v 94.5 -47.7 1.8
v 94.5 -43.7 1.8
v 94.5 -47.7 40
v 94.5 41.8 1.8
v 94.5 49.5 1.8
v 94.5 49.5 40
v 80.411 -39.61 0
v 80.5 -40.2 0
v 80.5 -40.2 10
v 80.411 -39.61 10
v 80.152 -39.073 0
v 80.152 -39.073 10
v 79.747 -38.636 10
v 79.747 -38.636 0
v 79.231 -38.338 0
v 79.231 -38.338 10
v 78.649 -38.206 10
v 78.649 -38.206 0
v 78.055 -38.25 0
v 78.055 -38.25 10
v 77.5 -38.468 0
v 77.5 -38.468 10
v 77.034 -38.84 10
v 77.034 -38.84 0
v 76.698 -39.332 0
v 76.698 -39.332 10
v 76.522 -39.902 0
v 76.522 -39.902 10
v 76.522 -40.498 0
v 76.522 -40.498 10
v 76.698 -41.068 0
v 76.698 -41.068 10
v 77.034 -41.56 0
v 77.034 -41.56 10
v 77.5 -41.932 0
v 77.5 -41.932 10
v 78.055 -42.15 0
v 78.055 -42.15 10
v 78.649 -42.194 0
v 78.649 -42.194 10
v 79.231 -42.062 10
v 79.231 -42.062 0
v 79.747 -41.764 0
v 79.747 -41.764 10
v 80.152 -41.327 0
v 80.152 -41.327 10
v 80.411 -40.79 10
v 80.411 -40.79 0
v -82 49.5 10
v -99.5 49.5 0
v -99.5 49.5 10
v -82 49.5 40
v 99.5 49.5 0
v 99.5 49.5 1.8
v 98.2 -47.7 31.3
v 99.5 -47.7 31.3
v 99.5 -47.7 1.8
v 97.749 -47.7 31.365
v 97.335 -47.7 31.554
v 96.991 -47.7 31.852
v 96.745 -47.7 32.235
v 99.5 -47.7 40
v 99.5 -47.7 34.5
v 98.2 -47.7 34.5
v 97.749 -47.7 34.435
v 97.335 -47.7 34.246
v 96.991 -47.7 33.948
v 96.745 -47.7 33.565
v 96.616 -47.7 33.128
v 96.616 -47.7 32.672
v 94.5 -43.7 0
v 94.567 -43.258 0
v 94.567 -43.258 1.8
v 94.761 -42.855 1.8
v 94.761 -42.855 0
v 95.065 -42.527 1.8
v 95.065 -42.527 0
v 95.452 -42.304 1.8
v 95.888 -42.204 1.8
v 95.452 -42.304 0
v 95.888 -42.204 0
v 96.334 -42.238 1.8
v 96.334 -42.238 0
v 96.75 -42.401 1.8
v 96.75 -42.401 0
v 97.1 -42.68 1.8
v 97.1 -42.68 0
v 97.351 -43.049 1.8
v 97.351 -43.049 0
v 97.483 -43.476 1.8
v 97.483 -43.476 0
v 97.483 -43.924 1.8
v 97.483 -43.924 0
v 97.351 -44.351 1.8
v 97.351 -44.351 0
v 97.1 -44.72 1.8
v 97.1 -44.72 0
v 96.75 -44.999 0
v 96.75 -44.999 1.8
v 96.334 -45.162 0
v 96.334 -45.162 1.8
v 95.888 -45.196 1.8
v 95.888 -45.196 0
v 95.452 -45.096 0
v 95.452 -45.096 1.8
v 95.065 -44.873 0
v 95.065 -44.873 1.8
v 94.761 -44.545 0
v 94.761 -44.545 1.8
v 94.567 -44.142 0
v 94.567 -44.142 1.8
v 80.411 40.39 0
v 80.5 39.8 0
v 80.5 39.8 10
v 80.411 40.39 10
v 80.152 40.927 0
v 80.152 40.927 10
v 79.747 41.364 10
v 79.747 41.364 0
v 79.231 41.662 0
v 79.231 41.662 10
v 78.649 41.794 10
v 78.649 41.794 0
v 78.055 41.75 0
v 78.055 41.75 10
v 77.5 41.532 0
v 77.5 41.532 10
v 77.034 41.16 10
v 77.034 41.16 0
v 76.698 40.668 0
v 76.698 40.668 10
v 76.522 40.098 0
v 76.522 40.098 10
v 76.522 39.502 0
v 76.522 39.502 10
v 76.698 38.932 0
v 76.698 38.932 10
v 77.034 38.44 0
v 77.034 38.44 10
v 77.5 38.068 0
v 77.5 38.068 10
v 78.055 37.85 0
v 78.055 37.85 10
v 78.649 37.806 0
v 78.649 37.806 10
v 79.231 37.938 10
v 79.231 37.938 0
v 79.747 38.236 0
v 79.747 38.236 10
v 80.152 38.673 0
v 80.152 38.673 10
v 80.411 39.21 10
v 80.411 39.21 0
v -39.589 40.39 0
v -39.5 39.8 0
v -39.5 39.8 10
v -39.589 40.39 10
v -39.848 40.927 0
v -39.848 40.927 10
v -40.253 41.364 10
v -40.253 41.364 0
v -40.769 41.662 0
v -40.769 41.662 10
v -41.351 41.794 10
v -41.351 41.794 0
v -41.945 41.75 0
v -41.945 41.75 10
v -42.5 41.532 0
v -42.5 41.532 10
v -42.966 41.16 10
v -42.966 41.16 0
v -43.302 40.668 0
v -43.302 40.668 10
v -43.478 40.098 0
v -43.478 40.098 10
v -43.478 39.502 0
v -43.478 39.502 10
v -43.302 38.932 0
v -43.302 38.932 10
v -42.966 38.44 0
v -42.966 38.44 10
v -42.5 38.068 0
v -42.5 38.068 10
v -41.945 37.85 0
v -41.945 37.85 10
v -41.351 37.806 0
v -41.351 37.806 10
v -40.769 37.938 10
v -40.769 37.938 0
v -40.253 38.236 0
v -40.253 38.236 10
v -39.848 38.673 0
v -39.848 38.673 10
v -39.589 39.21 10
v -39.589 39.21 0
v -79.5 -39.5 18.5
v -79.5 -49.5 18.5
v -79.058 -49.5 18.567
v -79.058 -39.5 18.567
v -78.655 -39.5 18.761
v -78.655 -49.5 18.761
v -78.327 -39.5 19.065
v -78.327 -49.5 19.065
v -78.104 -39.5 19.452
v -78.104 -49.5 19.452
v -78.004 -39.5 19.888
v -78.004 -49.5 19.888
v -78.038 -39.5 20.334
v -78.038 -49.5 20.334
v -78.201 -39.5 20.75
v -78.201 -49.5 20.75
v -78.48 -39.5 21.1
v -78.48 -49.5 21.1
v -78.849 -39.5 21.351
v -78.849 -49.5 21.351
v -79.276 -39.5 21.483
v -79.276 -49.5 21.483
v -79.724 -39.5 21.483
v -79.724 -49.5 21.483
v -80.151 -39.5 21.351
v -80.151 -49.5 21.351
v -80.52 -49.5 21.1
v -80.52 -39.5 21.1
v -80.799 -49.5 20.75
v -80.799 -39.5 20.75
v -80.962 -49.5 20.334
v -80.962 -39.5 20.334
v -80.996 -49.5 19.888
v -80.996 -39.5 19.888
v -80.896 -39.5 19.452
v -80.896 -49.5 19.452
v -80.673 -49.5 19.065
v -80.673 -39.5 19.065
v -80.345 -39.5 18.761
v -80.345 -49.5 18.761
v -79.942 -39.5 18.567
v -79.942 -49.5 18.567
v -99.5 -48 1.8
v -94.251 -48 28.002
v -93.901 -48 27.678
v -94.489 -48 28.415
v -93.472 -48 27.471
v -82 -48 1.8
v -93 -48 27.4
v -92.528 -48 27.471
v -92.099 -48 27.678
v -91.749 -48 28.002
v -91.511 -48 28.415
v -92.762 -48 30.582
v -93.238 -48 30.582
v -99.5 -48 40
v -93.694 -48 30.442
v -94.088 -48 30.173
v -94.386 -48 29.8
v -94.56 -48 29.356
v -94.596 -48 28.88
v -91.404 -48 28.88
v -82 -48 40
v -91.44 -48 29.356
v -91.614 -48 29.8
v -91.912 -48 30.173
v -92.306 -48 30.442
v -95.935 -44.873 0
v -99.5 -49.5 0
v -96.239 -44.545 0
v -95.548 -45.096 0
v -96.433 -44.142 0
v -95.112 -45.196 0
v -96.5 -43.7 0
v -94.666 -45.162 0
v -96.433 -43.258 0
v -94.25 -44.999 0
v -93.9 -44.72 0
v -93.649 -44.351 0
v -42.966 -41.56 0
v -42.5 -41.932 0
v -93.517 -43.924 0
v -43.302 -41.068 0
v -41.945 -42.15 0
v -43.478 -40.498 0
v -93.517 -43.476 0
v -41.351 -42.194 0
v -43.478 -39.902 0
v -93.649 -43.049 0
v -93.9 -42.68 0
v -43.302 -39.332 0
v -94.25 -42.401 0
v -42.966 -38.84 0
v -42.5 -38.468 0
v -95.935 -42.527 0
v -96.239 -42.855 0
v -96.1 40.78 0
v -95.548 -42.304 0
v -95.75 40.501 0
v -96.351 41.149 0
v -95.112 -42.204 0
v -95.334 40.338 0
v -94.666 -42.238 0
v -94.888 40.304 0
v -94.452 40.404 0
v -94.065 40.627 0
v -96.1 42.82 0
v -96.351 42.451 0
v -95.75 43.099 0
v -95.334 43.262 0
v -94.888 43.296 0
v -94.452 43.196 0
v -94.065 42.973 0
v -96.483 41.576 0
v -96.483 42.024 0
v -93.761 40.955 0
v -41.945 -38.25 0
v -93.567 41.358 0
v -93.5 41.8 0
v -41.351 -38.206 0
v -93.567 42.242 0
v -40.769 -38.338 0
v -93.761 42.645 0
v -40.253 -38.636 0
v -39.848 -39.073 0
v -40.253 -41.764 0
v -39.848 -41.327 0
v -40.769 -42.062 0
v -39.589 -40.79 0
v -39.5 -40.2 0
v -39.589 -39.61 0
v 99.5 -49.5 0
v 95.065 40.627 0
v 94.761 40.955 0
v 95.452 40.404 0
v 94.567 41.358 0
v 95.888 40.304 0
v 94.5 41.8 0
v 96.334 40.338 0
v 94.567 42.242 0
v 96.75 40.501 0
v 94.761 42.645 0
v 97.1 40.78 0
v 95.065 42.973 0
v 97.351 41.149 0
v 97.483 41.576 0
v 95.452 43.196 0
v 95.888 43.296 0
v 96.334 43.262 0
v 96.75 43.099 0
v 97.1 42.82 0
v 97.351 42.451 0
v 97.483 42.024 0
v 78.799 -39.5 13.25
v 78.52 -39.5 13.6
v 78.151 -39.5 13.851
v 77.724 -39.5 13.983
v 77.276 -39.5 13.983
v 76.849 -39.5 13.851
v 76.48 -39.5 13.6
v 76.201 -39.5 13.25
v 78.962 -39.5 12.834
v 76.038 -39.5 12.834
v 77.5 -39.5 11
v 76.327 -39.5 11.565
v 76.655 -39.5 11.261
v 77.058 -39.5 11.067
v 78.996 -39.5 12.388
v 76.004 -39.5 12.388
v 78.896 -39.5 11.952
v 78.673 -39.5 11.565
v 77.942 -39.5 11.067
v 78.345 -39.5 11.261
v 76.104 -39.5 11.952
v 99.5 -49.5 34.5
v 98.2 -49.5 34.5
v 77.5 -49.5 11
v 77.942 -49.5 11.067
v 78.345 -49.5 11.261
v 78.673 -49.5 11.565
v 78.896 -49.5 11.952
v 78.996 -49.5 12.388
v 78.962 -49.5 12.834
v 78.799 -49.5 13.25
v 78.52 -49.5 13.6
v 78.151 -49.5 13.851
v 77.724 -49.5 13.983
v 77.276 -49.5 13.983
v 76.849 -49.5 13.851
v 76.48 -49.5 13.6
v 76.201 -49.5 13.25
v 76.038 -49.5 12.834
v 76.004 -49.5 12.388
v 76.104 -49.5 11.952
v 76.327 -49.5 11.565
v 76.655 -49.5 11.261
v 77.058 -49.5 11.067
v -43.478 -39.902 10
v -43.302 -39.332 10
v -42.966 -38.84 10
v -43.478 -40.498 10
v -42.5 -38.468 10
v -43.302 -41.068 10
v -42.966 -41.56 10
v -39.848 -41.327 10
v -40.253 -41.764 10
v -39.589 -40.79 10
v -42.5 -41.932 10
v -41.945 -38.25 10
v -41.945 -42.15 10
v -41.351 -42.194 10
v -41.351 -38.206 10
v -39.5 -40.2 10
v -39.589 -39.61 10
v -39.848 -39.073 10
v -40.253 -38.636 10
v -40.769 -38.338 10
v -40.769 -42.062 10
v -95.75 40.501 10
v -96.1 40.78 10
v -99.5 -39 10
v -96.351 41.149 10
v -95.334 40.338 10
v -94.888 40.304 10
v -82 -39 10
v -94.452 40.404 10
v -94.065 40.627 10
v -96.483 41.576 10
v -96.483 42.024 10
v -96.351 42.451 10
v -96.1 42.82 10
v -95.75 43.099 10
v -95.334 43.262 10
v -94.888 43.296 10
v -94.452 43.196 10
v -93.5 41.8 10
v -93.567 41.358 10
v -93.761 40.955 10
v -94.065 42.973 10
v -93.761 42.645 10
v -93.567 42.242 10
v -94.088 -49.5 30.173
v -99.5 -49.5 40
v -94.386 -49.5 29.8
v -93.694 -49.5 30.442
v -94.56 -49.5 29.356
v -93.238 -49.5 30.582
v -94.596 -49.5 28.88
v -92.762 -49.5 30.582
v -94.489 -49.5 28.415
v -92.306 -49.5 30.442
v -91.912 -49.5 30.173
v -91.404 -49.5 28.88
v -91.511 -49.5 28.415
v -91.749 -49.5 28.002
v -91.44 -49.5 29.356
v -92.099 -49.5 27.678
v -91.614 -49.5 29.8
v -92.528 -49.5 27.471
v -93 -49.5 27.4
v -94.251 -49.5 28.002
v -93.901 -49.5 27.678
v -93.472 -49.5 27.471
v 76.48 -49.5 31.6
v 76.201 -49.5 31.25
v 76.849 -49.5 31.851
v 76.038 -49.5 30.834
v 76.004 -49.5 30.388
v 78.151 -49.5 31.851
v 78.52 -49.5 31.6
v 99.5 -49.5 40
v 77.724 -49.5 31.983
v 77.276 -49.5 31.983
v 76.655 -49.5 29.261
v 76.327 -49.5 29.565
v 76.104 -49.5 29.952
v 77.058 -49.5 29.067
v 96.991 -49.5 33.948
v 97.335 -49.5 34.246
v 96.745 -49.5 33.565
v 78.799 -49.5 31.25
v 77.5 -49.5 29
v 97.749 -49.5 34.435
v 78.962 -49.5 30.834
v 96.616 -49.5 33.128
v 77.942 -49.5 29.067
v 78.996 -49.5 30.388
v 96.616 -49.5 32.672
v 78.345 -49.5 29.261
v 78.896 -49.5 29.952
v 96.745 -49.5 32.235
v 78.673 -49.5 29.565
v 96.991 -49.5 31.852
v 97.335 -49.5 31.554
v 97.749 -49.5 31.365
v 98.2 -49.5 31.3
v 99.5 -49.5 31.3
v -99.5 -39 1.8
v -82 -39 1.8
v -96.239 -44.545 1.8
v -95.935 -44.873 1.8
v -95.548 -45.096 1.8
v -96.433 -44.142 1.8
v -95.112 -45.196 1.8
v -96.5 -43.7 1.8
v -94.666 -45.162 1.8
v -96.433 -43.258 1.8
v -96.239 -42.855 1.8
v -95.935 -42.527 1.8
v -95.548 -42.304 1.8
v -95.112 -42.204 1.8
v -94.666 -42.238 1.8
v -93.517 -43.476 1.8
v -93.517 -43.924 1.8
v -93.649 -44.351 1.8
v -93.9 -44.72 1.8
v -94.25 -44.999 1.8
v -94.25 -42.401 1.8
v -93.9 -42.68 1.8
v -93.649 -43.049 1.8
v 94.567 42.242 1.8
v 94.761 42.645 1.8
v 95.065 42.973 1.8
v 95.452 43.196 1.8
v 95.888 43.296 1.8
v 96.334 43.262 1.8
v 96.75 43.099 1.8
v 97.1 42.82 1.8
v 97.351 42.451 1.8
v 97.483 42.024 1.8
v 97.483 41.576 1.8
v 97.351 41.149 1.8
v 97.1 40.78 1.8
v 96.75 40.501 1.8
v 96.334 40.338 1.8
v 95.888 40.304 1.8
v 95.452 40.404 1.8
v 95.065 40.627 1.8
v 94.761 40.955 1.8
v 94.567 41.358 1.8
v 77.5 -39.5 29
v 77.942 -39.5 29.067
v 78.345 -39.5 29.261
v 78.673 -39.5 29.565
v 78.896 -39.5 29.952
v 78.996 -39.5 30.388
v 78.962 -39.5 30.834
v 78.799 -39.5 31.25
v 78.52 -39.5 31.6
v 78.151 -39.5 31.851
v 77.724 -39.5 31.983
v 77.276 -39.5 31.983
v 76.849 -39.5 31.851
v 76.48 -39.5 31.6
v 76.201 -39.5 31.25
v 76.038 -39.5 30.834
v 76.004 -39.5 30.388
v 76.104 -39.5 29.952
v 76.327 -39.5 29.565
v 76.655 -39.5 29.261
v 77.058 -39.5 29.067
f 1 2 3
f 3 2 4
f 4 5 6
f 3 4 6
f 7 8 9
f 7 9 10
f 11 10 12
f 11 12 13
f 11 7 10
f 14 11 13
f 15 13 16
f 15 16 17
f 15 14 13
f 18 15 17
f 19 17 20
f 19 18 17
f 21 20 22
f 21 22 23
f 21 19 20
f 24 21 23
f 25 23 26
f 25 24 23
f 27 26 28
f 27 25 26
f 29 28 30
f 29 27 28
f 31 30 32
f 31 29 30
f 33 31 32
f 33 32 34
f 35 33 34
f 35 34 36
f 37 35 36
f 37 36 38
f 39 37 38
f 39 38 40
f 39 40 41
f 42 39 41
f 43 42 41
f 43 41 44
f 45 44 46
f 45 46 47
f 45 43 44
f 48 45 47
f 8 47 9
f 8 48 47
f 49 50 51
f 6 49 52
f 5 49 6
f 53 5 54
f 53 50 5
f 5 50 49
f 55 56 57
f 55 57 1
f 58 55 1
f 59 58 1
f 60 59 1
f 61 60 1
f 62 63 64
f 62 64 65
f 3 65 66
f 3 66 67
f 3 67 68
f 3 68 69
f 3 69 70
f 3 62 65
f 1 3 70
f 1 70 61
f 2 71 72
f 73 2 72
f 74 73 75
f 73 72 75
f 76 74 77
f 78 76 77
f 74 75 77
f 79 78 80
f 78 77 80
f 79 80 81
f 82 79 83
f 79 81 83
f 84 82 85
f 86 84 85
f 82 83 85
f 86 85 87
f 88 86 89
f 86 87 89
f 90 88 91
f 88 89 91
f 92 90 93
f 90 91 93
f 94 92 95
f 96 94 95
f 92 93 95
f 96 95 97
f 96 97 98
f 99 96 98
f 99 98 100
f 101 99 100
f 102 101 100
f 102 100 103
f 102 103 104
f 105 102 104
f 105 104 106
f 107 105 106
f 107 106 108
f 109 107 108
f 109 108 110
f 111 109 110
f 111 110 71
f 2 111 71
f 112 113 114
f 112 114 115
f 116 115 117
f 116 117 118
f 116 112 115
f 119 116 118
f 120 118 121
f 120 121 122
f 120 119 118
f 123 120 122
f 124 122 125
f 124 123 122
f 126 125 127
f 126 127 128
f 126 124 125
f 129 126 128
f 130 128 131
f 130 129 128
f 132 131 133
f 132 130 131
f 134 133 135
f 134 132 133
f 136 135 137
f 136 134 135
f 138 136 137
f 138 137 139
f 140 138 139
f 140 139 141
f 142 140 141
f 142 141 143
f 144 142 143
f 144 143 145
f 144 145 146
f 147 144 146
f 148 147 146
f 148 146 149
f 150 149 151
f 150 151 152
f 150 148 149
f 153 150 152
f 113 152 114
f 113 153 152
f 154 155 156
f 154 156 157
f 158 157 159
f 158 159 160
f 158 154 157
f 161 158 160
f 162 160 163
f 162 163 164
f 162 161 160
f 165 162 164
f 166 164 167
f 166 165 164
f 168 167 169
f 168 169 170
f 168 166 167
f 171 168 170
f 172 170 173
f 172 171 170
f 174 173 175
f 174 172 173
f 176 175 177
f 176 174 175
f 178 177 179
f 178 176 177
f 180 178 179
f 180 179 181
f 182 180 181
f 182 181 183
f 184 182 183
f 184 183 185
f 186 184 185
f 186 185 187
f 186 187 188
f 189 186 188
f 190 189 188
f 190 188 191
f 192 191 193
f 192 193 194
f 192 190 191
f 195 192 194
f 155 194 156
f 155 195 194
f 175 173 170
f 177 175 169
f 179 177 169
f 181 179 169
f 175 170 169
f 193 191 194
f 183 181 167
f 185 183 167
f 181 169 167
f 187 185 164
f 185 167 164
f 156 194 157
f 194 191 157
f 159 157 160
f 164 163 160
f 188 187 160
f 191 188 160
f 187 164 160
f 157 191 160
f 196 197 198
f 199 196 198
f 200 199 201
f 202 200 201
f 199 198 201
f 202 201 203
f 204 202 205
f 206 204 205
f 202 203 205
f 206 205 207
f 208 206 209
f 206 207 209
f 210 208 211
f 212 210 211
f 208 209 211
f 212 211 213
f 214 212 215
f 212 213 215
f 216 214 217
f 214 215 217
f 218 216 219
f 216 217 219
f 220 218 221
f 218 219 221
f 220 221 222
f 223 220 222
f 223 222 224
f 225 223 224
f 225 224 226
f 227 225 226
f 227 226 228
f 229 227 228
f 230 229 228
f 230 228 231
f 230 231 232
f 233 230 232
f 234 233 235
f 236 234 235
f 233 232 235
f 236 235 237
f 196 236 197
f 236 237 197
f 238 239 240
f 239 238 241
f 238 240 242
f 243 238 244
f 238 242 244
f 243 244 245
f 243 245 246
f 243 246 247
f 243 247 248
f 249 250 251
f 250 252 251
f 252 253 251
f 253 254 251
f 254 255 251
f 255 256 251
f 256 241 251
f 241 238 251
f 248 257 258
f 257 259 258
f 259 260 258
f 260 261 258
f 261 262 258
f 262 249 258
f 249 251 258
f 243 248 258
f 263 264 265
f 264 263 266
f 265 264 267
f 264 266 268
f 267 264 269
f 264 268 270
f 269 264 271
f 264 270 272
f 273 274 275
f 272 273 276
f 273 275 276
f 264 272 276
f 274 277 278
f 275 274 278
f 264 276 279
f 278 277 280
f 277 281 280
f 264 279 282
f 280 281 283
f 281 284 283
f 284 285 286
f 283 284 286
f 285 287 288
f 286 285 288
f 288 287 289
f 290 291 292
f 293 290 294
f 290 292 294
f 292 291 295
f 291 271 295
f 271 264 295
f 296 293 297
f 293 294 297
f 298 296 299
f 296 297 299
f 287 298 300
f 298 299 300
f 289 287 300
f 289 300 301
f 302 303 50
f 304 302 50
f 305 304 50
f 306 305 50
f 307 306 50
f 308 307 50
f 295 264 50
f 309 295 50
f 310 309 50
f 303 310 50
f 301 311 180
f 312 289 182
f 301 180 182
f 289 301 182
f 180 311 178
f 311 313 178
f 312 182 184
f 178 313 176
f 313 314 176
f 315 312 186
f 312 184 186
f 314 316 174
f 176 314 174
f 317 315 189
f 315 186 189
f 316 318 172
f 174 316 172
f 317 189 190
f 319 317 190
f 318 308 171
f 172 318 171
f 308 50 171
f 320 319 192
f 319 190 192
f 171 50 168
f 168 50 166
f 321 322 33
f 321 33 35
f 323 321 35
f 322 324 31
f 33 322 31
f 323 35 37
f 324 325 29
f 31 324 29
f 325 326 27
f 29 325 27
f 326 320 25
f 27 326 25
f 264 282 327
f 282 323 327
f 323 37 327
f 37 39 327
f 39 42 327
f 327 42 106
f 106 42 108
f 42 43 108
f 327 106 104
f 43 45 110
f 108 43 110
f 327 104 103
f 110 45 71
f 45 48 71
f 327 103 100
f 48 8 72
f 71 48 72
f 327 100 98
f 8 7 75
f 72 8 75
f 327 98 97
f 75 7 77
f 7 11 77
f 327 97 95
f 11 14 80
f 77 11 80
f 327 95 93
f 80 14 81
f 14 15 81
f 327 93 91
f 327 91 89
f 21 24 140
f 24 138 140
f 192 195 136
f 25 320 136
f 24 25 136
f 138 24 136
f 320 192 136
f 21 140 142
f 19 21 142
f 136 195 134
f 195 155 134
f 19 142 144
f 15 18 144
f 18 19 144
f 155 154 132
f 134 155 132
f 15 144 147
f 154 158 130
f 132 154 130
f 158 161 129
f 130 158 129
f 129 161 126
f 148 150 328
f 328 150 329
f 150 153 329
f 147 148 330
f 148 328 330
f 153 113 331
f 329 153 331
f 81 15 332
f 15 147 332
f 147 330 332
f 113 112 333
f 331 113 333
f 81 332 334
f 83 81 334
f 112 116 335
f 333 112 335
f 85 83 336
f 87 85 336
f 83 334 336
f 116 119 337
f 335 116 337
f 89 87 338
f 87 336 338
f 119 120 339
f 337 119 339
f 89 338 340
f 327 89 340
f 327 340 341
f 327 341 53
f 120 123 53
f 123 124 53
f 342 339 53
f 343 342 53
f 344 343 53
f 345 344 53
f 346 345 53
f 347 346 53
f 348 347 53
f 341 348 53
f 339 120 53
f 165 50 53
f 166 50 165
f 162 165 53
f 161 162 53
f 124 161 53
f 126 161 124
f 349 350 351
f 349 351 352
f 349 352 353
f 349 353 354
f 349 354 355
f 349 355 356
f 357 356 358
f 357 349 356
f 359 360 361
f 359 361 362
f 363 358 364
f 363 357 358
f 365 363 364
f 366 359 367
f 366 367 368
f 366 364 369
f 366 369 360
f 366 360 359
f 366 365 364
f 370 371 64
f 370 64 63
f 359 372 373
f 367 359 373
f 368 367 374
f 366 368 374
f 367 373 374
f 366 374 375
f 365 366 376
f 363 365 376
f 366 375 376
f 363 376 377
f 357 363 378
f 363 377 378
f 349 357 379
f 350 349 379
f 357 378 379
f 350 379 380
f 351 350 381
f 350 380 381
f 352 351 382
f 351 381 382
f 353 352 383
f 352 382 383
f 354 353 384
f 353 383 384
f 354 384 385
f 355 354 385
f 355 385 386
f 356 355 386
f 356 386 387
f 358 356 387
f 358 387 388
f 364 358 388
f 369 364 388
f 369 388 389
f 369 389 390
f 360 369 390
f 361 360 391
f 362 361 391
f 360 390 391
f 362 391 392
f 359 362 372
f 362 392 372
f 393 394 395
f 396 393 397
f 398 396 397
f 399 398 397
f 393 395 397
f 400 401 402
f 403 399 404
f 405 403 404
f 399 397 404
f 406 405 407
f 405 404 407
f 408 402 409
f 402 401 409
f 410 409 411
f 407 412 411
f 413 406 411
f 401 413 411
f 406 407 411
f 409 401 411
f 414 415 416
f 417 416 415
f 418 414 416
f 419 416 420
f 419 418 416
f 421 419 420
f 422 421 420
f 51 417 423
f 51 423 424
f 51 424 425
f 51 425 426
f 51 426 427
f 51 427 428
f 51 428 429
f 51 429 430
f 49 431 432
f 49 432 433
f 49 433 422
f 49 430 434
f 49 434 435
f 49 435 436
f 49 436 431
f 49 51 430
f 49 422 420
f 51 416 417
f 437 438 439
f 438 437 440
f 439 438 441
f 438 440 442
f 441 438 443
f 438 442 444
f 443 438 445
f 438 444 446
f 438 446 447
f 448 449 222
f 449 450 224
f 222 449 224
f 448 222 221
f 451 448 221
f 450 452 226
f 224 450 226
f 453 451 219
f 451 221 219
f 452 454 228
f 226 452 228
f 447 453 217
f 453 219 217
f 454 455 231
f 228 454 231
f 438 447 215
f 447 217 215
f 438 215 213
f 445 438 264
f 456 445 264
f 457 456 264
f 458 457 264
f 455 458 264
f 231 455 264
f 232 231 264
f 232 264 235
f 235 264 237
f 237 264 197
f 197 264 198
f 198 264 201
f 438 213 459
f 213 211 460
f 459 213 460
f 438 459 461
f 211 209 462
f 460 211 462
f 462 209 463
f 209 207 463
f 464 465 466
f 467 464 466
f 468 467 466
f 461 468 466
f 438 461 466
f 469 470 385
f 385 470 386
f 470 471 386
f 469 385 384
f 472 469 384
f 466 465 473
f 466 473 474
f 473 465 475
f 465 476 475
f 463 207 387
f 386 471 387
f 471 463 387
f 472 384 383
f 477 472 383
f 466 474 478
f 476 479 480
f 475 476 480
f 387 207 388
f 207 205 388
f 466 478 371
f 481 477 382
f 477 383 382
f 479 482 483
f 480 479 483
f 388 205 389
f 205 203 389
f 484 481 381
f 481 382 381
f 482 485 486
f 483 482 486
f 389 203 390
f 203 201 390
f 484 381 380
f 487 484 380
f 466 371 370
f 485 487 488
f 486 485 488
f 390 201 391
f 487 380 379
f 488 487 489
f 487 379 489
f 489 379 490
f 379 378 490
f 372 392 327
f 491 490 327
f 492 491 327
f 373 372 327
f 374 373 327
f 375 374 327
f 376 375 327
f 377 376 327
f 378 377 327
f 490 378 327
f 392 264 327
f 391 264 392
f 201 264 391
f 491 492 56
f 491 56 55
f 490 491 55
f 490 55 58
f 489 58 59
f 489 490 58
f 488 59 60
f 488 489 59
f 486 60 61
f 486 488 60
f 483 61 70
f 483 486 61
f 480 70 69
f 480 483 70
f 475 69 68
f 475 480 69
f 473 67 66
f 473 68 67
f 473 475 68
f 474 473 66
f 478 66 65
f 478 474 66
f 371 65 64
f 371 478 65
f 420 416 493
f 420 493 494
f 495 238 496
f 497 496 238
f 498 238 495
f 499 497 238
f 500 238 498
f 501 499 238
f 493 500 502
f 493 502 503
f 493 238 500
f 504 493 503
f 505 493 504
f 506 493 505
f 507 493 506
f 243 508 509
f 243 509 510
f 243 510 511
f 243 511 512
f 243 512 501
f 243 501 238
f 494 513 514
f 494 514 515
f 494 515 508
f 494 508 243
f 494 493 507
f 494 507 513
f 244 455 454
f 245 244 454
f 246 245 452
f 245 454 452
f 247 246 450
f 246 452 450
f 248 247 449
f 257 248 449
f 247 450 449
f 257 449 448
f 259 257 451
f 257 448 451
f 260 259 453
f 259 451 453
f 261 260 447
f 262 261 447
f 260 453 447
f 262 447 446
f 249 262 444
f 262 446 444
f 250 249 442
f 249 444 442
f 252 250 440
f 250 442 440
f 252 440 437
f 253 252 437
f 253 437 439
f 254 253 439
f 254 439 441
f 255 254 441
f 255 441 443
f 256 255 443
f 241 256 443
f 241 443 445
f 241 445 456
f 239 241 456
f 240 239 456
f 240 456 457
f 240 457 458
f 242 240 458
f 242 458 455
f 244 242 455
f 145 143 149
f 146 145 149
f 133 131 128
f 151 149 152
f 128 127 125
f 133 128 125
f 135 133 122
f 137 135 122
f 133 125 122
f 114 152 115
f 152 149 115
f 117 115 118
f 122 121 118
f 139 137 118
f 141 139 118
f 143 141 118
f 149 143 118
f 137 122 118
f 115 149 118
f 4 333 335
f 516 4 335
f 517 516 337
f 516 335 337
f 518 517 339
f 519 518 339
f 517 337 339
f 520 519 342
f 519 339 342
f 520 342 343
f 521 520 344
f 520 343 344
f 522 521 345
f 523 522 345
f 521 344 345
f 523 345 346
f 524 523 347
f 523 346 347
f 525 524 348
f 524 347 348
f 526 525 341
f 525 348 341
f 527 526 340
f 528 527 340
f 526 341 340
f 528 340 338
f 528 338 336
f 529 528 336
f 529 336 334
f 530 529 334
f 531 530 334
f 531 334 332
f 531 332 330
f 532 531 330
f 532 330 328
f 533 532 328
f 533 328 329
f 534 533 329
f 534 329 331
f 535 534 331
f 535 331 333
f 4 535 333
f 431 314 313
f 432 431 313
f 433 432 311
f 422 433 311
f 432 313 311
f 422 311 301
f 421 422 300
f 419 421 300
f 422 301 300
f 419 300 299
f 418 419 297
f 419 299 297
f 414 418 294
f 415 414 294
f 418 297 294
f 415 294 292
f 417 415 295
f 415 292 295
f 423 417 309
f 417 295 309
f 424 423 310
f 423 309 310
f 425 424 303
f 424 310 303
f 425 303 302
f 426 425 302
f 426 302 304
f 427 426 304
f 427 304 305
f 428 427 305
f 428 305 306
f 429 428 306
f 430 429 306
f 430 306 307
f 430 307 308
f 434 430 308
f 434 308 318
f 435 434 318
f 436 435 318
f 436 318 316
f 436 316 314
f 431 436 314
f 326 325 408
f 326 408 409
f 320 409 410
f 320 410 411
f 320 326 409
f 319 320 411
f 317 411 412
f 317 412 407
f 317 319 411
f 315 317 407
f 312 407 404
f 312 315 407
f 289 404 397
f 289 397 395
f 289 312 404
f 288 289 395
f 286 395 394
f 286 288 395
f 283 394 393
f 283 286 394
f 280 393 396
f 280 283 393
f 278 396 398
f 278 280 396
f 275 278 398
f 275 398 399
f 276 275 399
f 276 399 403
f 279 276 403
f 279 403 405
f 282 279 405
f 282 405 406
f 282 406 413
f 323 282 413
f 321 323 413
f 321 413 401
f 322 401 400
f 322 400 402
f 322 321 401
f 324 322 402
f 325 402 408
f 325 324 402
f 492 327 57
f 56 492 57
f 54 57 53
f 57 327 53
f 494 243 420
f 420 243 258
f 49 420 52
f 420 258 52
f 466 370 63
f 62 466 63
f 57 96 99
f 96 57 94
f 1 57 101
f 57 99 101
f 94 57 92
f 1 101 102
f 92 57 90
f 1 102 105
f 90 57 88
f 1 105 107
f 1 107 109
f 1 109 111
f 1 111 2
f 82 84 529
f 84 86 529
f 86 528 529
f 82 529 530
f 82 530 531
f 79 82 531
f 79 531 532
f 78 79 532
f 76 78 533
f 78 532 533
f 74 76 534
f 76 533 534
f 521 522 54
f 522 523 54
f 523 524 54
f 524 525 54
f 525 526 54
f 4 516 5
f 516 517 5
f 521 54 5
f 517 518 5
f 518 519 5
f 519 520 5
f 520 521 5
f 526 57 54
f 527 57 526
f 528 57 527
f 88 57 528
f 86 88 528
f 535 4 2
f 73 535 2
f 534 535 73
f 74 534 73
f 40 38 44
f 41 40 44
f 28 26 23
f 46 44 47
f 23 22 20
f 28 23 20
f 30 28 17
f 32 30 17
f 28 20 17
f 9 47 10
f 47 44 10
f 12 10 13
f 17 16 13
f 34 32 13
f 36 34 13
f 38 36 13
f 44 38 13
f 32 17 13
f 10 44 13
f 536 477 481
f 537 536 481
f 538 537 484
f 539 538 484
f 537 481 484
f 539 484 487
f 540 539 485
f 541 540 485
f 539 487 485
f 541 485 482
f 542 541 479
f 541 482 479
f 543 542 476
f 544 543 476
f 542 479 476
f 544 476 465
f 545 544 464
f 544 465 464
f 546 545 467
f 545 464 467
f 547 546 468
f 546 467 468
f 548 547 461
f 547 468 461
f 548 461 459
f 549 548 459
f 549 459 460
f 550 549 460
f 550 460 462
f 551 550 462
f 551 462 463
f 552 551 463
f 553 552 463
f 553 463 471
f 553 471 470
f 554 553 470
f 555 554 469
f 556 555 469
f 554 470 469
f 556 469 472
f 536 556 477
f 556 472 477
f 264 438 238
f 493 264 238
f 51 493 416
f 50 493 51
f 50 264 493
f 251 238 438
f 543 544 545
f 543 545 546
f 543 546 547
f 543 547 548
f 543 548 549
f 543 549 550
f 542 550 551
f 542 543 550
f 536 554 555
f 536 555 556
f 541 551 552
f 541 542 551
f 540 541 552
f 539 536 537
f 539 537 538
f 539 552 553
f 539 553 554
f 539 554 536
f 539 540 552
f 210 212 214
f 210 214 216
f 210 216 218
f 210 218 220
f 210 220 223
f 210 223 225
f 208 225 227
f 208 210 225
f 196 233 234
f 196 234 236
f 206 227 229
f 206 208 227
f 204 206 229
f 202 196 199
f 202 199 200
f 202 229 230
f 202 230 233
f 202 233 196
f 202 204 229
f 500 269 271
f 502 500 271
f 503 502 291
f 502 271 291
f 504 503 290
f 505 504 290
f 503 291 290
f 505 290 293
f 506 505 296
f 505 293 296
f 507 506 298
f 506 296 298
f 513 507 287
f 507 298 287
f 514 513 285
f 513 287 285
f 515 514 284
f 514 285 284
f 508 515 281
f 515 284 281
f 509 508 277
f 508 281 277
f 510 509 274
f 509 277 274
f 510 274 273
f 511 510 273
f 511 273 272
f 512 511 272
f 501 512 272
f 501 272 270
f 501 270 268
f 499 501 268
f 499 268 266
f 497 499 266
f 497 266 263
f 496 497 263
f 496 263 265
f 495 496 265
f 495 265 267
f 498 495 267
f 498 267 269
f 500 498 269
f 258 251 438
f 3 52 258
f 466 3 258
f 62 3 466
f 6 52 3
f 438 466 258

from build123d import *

# Parameters (mm, degrees)
SKETCH_1_W          = 199
SKETCH_1_H          = 99
EXTRUDE_1_DEPTH     = 40
SKETCH_3_W          = 17.5
SKETCH_3_H          = 97.5
CUT_EXTRUDE_2_DEPTH = 30
SKETCH_6_W          = 5
SKETCH_6_H          = 38.2
CUT_EXTRUDE_5_DEPTH = 97.2
SKETCH_7_W          = 17.5
SKETCH_7_H          = 9
CUT_EXTRUDE_6_DEPTH = 8.2
SKETCH_2_R          = 2
CUT_EXTRUDE_1_DEPTH = 10
SKETCH_4_R          = 1.5
CUT_EXTRUDE_3_DEPTH = 10
SKETCH_5_R          = 1.6
CUT_EXTRUDE_4_DEPTH = 10
SKETCH_8_R          = 1.5
CUT_EXTRUDE_7_DEPTH = 119.11223476


with BuildPart() as part:
    # 草图1 → 拉伸1 (new body)
    with BuildSketch(Plane.XY):
        Rectangle(SKETCH_1_W, SKETCH_1_H)
    extrude(amount=EXTRUDE_1_DEPTH)

    # 草图3 → 切除-拉伸2 (cut)
    with BuildSketch(Plane.XY.offset(40)):
        with Locations((-90.75, 0.75)):
            Rectangle(SKETCH_3_W, SKETCH_3_H)
    extrude(amount=-CUT_EXTRUDE_2_DEPTH, mode=Mode.SUBTRACT)

    # 草图6 → 切除-拉伸5 (cut)
    with BuildSketch(Plane(origin=(0, 49.5, 0), x_dir=(-1, 0, 0), z_dir=(0, 1, 0))):
        with Locations((-97, 20.9)):
            Rectangle(SKETCH_6_W, SKETCH_6_H)
    extrude(amount=-CUT_EXTRUDE_5_DEPTH, mode=Mode.SUBTRACT)

    # 草图7 → 切除-拉伸6 (cut)
    with BuildSketch(Plane.XY.offset(10)):
        with Locations((-90.75, -43.5)):
            Rectangle(SKETCH_7_W, SKETCH_7_H)
    extrude(amount=-CUT_EXTRUDE_6_DEPTH, mode=Mode.SUBTRACT)

    # 草图2 → 切除-拉伸1 (cut)
    with BuildSketch(Plane.XY):
        with Locations((-41.5, 39.8)):
            Circle(SKETCH_2_R)
        with Locations((78.5, 39.8)):
            Circle(SKETCH_2_R)
        with Locations((-41.5, -40.2)):
            Circle(SKETCH_2_R)
        with Locations((78.5, -40.2)):
            Circle(SKETCH_2_R)
    extrude(amount=CUT_EXTRUDE_1_DEPTH, mode=Mode.SUBTRACT)

    # 草图4 → 切除-拉伸3 (cut)
    with BuildSketch(Plane.XZ.offset(49.5)):
        with Locations(Location((-79.5, 20, 0), (0, 0, 270))):
            Circle(SKETCH_4_R)
        with Locations(Location((77.5, 12.5, 0), (0, 0, 270))):
            Circle(SKETCH_4_R)
        with Locations(Location((77.5, 30.5, 0), (0, 0, 270))):
            Circle(SKETCH_4_R)
    extrude(amount=-CUT_EXTRUDE_3_DEPTH, mode=Mode.SUBTRACT)

    # 草图5 → 切除-拉伸4 (cut)
    with BuildSketch(Plane.XZ.offset(49.5)):
        with Locations(Location((-93, 29, 0), (0, 0, 270))):
            Circle(SKETCH_5_R)
        with BuildLine():
            Line((99.5, 34.5), (99.5, 31.3))
            Line((99.5, 31.3), (98.2, 31.3))
            ThreePointArc((98.2, 31.3), (96.6, 32.9), (98.2, 34.5))
            Line((98.2, 34.5), (99.5, 34.5))
        make_face()
    extrude(amount=-CUT_EXTRUDE_4_DEPTH, mode=Mode.SUBTRACT)

    # 草图8 → 切除-拉伸7 (cut, through all)
    with BuildSketch(Plane(origin=(0, 0, 0), x_dir=(-1, 0, 0), z_dir=(0, 0, -1))):
        with Locations((-96, 41.8)):
            Circle(SKETCH_8_R)
        with Locations((-96, -43.7)):
            Circle(SKETCH_8_R)
        with Locations((95, -43.7)):
            Circle(SKETCH_8_R)
        with Locations(Location((95, 41.8, 0), (0, 0, 180))):
            Circle(SKETCH_8_R)
    extrude(amount=-CUT_EXTRUDE_7_DEPTH, mode=Mode.SUBTRACT)


solid = part.part
